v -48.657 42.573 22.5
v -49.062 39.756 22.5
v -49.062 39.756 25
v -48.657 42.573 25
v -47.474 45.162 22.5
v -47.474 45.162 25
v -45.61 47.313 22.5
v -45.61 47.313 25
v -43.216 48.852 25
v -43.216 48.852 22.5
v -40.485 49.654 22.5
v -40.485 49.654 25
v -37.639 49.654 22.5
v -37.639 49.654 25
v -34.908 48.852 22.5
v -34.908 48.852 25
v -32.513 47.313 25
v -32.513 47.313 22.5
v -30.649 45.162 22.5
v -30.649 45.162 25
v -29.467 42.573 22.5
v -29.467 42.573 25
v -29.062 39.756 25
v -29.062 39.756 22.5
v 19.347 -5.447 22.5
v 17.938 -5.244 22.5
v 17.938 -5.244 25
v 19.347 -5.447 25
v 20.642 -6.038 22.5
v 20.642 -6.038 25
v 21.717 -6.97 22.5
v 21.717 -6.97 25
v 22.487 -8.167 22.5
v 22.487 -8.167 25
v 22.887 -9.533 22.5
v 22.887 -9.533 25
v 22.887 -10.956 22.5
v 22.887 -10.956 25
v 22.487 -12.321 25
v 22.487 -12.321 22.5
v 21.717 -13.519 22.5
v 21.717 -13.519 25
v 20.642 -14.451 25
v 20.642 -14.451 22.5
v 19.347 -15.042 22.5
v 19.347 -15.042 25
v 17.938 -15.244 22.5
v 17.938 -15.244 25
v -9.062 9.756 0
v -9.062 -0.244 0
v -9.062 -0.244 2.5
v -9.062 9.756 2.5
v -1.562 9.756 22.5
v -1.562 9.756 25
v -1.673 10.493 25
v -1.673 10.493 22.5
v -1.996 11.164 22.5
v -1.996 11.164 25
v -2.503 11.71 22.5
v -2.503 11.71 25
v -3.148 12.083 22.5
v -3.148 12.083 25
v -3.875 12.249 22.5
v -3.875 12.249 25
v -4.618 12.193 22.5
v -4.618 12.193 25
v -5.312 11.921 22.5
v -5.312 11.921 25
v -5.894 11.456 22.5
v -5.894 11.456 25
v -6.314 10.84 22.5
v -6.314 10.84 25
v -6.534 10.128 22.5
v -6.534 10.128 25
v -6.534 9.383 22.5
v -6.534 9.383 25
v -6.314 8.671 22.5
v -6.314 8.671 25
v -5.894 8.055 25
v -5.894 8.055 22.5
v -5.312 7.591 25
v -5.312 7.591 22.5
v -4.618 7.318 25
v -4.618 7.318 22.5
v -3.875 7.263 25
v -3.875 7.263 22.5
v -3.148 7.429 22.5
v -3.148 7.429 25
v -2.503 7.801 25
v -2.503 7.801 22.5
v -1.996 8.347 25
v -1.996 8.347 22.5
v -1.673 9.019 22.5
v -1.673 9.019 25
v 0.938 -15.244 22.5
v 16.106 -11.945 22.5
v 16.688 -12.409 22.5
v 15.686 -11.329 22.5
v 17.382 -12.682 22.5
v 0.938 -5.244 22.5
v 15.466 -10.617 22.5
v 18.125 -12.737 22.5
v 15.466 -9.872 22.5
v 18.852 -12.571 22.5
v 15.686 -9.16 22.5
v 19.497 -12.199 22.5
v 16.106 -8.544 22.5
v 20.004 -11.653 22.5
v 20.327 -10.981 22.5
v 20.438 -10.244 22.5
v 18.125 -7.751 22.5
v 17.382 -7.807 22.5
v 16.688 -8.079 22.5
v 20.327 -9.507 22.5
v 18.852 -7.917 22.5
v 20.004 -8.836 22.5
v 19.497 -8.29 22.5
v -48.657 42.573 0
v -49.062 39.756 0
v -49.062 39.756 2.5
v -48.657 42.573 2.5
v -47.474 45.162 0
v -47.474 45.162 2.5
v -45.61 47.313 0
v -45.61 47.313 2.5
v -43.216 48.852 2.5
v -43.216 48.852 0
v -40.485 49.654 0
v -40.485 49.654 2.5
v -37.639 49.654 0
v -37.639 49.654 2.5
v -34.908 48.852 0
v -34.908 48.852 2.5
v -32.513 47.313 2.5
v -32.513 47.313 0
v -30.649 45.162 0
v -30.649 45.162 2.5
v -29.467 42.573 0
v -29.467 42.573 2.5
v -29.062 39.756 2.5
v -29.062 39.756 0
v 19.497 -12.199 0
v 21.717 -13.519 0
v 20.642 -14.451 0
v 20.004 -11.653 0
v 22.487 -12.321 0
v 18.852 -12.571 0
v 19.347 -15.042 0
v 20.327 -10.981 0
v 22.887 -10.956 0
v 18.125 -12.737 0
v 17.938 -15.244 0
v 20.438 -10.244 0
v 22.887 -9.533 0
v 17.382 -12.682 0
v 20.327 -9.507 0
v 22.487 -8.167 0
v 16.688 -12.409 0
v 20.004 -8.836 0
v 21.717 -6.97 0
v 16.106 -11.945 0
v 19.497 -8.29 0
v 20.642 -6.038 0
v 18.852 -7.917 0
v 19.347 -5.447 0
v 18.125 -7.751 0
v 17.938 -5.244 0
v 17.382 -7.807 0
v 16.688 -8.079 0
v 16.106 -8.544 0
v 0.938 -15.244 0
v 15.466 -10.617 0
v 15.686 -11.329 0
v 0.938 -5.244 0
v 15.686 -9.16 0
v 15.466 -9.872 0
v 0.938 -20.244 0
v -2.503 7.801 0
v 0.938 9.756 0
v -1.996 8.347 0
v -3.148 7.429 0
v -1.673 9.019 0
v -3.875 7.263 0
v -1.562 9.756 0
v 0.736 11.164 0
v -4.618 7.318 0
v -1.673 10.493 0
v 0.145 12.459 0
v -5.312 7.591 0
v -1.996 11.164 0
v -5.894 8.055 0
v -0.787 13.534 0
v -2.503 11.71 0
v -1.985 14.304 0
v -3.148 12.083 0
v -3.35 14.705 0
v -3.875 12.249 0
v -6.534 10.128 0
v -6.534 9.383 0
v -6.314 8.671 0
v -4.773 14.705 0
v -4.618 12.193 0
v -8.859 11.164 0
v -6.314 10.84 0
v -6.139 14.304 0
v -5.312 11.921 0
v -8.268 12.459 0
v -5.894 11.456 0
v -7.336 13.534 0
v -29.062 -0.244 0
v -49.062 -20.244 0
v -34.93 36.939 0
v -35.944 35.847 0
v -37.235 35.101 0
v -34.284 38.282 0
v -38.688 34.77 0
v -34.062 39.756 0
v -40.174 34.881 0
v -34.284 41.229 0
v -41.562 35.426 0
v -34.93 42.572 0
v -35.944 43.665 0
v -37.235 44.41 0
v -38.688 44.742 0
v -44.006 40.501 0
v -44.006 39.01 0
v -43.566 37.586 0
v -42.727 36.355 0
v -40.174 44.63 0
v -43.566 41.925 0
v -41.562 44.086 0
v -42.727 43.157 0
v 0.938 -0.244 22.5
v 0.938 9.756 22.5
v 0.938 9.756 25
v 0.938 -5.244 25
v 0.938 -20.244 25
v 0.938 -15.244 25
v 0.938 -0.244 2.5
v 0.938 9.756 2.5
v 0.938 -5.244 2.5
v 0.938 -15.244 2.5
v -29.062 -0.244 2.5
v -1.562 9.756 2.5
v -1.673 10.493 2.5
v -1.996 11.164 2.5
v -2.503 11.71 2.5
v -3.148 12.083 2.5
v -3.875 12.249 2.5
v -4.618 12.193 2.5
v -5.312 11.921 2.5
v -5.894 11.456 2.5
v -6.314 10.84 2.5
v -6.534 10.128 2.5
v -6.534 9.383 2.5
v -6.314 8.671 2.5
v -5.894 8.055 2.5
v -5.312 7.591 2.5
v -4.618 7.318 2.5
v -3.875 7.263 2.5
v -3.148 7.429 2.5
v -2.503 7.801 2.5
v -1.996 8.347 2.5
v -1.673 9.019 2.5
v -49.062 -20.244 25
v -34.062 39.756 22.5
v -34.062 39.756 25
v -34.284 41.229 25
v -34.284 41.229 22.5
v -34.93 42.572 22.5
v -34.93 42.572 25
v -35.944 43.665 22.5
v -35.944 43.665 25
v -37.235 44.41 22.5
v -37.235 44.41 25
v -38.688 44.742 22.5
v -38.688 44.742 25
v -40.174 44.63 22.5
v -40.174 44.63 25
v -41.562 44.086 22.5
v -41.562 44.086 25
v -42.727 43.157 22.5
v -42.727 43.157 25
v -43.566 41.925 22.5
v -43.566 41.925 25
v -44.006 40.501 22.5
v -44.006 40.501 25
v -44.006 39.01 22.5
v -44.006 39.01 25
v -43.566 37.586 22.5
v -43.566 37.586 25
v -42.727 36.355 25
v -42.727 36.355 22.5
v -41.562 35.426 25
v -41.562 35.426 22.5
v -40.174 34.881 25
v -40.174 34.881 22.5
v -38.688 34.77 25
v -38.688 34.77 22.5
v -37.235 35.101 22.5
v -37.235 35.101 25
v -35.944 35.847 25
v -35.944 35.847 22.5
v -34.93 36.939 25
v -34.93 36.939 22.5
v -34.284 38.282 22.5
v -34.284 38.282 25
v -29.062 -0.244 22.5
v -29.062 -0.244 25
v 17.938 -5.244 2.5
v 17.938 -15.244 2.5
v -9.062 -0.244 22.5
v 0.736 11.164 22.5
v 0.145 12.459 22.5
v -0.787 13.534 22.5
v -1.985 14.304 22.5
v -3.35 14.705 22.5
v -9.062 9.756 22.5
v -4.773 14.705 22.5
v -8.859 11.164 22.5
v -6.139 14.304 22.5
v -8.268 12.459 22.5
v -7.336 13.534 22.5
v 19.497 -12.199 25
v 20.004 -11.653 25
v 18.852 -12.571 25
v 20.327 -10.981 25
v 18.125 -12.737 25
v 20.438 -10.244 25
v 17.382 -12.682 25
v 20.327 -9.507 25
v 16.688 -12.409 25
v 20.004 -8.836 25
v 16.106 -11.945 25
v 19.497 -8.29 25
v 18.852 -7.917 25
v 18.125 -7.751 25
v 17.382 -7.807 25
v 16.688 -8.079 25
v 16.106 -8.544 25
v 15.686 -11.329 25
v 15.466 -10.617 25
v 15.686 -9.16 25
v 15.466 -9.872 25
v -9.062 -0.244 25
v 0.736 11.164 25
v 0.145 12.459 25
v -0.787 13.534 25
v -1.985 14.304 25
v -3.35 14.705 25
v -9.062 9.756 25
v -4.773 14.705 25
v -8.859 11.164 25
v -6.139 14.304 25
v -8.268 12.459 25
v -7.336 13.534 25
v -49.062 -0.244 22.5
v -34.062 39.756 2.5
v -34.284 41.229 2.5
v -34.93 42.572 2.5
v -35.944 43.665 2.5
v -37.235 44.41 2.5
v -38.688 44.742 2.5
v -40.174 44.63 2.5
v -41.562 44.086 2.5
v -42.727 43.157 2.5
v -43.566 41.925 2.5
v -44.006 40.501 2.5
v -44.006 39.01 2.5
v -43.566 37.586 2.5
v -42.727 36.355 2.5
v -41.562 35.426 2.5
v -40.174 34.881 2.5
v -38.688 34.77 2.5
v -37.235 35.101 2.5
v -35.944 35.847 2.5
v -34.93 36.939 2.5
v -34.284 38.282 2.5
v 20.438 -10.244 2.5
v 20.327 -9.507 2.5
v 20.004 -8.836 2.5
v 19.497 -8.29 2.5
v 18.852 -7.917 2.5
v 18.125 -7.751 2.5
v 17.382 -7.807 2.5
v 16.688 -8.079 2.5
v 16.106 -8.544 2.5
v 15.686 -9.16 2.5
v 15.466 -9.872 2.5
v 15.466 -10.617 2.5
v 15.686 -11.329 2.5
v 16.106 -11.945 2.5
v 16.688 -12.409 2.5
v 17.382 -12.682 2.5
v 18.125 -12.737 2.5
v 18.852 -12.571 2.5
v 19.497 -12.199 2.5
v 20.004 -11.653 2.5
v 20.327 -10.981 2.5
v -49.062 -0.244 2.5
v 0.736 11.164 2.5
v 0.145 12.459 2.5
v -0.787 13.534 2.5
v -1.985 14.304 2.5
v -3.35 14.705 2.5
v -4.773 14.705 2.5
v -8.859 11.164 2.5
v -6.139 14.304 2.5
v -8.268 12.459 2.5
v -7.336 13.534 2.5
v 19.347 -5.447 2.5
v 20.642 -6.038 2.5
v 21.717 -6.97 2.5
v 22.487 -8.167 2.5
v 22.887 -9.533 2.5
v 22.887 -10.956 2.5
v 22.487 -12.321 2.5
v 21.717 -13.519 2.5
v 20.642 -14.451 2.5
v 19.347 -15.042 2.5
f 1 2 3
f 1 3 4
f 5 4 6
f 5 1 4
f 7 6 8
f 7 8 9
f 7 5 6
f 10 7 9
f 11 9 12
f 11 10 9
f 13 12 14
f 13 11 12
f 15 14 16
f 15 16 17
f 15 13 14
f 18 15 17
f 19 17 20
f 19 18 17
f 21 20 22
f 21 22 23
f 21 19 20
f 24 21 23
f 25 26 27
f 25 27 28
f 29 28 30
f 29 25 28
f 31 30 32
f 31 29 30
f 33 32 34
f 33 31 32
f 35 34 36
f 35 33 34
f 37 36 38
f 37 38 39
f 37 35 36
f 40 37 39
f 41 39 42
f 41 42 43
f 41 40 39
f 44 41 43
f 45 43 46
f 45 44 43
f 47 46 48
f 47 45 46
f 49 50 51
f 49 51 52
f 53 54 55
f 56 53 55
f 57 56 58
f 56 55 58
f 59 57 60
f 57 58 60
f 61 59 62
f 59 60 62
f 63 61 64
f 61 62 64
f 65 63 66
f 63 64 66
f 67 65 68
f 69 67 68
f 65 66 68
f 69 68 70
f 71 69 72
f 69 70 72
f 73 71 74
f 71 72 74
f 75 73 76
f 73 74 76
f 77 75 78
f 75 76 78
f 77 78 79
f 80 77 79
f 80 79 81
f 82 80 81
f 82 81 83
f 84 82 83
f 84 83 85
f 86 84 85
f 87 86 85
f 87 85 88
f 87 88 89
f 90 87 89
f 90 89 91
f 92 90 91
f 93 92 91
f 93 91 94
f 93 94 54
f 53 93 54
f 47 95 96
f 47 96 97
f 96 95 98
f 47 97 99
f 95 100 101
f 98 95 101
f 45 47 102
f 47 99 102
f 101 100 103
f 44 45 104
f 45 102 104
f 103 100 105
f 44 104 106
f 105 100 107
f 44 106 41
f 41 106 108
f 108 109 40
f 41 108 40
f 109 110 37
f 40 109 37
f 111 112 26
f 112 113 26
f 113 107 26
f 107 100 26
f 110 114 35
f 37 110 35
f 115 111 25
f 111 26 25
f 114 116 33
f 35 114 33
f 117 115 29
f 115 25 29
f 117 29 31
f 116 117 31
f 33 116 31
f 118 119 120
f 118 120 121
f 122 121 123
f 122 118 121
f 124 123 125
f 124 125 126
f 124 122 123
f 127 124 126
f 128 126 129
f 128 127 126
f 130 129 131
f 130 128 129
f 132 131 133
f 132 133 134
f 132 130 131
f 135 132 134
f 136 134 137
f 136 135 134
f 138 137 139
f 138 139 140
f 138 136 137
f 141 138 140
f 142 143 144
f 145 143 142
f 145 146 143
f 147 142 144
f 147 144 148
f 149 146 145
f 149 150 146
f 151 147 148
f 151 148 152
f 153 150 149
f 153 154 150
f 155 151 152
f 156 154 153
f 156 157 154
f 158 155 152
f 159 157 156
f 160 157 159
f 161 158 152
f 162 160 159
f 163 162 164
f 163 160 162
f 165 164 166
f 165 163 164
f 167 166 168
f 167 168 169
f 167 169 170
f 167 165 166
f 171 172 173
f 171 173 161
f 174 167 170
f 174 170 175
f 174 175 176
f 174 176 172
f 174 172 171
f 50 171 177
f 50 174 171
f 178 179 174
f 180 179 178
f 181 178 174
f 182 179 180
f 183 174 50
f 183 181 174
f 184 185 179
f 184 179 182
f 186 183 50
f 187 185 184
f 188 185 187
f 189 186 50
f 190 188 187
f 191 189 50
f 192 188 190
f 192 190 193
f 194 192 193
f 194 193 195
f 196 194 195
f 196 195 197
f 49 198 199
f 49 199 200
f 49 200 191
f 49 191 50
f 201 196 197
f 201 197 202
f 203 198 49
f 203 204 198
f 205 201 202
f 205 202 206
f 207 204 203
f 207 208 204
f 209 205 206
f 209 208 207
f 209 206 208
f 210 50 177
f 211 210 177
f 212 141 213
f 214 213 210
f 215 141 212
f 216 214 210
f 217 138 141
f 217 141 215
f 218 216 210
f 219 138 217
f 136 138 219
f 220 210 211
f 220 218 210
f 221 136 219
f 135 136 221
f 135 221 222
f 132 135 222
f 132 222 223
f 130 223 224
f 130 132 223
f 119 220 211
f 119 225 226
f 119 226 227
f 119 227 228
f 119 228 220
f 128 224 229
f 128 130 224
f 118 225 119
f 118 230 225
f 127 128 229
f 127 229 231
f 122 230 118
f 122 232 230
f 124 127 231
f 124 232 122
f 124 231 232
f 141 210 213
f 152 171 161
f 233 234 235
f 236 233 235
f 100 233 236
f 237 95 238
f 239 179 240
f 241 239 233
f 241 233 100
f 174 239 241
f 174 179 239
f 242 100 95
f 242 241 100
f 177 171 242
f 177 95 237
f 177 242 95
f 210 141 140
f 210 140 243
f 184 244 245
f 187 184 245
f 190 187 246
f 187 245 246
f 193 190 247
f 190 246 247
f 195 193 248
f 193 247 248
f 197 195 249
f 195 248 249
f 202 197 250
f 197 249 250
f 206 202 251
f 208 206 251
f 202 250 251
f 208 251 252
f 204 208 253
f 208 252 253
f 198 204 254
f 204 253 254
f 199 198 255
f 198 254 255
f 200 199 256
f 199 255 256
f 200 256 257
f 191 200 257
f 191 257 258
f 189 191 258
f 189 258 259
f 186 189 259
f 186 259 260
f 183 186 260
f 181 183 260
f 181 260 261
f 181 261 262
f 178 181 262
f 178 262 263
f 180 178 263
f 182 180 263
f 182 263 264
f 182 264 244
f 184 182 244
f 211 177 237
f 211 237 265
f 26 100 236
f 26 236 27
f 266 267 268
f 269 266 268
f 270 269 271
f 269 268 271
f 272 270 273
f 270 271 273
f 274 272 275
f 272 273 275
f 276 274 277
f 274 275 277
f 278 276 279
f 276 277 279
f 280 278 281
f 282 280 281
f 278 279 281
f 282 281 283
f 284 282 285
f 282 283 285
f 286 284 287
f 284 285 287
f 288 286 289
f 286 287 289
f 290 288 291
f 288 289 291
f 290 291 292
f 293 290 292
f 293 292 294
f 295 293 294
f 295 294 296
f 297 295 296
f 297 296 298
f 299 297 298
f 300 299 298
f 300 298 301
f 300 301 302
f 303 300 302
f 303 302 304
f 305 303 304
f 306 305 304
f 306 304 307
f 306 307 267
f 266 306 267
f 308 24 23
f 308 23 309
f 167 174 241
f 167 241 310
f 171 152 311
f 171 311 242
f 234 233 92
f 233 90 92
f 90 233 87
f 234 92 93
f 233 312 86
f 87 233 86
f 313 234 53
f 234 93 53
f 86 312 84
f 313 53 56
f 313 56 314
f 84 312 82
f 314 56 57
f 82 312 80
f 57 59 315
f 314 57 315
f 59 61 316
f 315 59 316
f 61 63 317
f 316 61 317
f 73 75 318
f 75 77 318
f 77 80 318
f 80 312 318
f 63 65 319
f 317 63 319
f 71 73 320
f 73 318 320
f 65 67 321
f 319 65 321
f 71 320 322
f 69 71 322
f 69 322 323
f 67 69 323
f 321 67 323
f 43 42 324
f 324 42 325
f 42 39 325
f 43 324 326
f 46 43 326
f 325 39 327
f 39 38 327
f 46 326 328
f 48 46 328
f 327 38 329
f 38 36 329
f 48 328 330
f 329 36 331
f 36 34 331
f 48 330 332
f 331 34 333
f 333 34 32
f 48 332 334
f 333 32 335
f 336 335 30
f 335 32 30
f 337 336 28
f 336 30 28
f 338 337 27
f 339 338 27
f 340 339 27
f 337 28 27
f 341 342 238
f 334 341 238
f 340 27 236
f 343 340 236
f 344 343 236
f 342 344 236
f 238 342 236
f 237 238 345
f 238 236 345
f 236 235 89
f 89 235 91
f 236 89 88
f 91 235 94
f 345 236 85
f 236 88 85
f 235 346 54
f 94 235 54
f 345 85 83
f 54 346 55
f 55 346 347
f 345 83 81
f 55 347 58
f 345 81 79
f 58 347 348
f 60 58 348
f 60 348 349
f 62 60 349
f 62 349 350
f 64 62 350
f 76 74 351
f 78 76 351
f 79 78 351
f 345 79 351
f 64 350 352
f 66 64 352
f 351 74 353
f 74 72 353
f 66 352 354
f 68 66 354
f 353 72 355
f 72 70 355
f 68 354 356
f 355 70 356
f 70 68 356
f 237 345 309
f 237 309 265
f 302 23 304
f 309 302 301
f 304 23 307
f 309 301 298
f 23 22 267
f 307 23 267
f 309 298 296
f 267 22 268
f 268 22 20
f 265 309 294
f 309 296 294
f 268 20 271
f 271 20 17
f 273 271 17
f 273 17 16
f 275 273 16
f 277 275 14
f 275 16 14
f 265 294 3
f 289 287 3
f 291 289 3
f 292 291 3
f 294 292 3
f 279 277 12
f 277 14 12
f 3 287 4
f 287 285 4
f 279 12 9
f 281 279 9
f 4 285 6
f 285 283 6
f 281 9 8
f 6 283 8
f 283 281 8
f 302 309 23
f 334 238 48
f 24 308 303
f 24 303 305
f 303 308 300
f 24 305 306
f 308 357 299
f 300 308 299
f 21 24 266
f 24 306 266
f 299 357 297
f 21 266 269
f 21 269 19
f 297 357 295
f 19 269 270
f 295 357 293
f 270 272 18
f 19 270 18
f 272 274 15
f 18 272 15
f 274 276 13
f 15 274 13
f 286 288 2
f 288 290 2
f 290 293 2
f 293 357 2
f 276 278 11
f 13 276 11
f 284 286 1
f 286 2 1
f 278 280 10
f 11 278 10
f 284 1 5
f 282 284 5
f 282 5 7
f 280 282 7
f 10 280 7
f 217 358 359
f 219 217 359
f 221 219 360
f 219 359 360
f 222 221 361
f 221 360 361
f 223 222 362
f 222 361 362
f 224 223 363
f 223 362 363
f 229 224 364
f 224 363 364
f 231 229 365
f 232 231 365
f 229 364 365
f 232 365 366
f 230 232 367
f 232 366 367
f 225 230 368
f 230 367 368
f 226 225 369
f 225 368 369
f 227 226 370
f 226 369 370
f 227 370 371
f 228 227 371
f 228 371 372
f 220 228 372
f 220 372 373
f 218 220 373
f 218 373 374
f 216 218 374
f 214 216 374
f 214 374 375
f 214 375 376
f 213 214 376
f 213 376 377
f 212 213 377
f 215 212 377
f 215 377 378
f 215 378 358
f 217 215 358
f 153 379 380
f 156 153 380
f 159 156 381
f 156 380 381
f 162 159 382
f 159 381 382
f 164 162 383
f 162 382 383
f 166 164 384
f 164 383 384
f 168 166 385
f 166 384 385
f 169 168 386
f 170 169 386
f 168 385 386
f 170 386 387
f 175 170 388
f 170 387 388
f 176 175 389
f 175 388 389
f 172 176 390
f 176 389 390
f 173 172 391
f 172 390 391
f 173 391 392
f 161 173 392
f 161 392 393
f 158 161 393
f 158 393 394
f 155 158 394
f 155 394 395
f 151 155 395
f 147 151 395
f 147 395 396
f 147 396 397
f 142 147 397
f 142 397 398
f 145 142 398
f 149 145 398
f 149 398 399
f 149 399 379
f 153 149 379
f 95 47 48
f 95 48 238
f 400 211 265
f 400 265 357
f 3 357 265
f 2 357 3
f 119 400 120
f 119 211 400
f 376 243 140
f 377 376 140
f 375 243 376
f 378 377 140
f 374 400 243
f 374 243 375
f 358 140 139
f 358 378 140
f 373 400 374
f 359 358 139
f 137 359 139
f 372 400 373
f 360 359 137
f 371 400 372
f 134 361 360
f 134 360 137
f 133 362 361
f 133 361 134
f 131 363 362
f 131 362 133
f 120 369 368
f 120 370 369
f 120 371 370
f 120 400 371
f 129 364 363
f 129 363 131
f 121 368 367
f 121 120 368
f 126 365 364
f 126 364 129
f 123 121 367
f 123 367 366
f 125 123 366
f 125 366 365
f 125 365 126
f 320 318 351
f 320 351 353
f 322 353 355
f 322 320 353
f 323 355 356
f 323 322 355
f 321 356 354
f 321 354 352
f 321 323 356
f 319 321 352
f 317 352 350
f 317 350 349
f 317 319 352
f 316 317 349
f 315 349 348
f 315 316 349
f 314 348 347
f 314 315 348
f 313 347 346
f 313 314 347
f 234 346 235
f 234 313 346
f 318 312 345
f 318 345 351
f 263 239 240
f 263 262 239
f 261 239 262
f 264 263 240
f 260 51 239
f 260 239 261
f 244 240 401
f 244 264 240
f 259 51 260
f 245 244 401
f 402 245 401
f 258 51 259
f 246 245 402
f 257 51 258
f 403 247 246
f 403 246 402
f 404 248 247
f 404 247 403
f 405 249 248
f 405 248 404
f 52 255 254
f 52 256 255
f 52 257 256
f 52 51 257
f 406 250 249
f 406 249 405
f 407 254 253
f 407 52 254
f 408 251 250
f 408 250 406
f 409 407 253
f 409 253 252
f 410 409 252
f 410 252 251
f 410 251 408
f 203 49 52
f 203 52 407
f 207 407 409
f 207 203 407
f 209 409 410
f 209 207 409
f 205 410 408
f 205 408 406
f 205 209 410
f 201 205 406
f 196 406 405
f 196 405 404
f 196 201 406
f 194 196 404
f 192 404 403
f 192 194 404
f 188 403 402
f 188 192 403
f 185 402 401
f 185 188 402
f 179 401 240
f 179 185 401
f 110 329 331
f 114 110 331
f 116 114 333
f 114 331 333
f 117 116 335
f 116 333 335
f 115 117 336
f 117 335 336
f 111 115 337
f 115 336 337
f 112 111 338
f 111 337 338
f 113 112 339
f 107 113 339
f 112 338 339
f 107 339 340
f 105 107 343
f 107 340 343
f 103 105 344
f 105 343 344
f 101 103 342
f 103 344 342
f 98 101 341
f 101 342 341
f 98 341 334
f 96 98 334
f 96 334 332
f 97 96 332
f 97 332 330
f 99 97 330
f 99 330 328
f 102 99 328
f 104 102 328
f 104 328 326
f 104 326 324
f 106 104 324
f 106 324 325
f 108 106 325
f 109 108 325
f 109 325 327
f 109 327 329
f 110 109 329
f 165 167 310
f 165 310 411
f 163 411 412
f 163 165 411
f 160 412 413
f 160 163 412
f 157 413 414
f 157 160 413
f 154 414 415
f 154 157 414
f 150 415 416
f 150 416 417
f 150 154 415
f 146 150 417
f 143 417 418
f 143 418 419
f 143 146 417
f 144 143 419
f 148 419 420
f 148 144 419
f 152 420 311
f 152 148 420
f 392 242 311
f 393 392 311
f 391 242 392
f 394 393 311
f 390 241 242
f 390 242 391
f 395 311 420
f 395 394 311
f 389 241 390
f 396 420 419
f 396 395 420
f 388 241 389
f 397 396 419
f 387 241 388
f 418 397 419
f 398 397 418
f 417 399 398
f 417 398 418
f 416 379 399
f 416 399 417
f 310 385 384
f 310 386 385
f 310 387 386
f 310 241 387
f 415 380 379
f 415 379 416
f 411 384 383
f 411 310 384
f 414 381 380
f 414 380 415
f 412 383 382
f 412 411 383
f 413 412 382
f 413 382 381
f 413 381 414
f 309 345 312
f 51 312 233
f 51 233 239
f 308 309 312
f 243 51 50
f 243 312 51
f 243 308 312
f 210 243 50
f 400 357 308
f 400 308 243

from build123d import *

# Parameters (mm, degrees)
BOSS_EXTRUDE1_DEPTH     = 25
CUT_EXTRUDE2_DEPTH      = 77.188110548
CUT_EXTRUDE2_DEPTH_BACK = 77.188110548
SKETCH3_W               = 20
SKETCH3_H               = 56.795841011
SKETCH4_R               = 5
CUT_EXTRUDE3_DEPTH      = 75.213706527
SKETCH5_R               = 2.5
CUT_EXTRUDE4_DEPTH      = 75.213706527
CUT_EXTRUDE5_REACH      = 79.827
SKETCH7_W               = 25.650683803
SKETCH7_H               = 20
SKETCH8_R               = 2.5
CUT_EXTRUDE6_DEPTH      = 75.213706527


with BuildPart() as part:
    # Sketch1 → Boss-Extrude1 (new body)
    with BuildSketch(Plane.XY):
        with BuildLine():
            Line((-49.061655574, -20.24431501), (-49.061655574, 39.75568499))
            ThreePointArc((-49.061655574, 39.75568499), (-39.061655574, 49.75568499), (-29.061655574, 39.75568499))
            Line((-29.061655574, 39.75568499), (-29.061655574, -0.24431501))
            Line((-29.061655574, -0.24431501), (-9.061655574, -0.24431501))
            Line((-9.061655574, -0.24431501), (-9.061655574, 9.75568499))
            ThreePointArc((-9.061655574, 9.75568499), (-4.061655574, 14.75568499), (0.938344426, 9.75568499))
            Line((0.938344426, 9.75568499), (0.938344426, -5.24431501))
            Line((0.938344426, -5.24431501), (17.938344426, -5.24431501))
            ThreePointArc((17.938344426, -5.24431501), (22.938344426, -10.24431501), (17.938344426, -15.24431501))
            Line((17.938344426, -15.24431501), (0.938344426, -15.24431501))
            Line((0.938344426, -15.24431501), (0.938344426, -20.24431501))
            Line((0.938344426, -20.24431501), (-49.061655574, -20.24431501))
        make_face()
    extrude(amount=BOSS_EXTRUDE1_DEPTH)

    # Sketch3 → Cut-Extrude2 (cut, two sides: drawn at the far end of the back side and taken through both)
    with BuildSketch(Plane(origin=(-29.061655574, 0, 0), x_dir=(0, 0, -1), z_dir=(1, 0, 0)).offset(-CUT_EXTRUDE2_DEPTH_BACK)):
        with Locations((-12.5, 28.153605496)):
            Rectangle(SKETCH3_W, SKETCH3_H)
    extrude(amount=CUT_EXTRUDE2_DEPTH + CUT_EXTRUDE2_DEPTH_BACK, mode=Mode.SUBTRACT)

    # Sketch4 → Cut-Extrude3 (cut, through all)
    with BuildSketch(Plane.XY.offset(25)):
        with Locations((-39.061655574, 39.75568499)):
            Circle(SKETCH4_R)
    extrude(amount=-CUT_EXTRUDE3_DEPTH, mode=Mode.SUBTRACT)

    # Sketch5 → Cut-Extrude4 (cut, through all)
    with BuildSketch(Plane.XY.offset(25)):
        with Locations((-4.061655574, 9.75568499)):
            Circle(SKETCH5_R)
    extrude(amount=-CUT_EXTRUDE4_DEPTH, mode=Mode.SUBTRACT)

    # Sketch7 → Cut-Extrude5 (cut, up to next)
    with BuildSketch(Plane(origin=(0, -5.24431501, 0), x_dir=(1, 0, 0), z_dir=(0, 1, 0)), mode=Mode.PRIVATE) as cut_extrude5_sk1:
        with Locations((13.763686328, -12.5)):
            Rectangle(SKETCH7_W, SKETCH7_H)
    cut_extrude5_tool1 = extrude(cut_extrude5_sk1.sketch, amount=-CUT_EXTRUDE5_REACH, mode=Mode.PRIVATE) & part.part
    add(cut_extrude5_tool1.solids().sort_by_distance((13.763686, -5.244315, 12.5))[0], mode=Mode.SUBTRACT)

    # Sketch8 → Cut-Extrude6 (cut, through all)
    with BuildSketch(Plane.XY.offset(25)):
        with Locations((17.938344426, -10.24431501)):
            Circle(SKETCH8_R)
    extrude(amount=-CUT_EXTRUDE6_DEPTH, mode=Mode.SUBTRACT)


solid = part.part
